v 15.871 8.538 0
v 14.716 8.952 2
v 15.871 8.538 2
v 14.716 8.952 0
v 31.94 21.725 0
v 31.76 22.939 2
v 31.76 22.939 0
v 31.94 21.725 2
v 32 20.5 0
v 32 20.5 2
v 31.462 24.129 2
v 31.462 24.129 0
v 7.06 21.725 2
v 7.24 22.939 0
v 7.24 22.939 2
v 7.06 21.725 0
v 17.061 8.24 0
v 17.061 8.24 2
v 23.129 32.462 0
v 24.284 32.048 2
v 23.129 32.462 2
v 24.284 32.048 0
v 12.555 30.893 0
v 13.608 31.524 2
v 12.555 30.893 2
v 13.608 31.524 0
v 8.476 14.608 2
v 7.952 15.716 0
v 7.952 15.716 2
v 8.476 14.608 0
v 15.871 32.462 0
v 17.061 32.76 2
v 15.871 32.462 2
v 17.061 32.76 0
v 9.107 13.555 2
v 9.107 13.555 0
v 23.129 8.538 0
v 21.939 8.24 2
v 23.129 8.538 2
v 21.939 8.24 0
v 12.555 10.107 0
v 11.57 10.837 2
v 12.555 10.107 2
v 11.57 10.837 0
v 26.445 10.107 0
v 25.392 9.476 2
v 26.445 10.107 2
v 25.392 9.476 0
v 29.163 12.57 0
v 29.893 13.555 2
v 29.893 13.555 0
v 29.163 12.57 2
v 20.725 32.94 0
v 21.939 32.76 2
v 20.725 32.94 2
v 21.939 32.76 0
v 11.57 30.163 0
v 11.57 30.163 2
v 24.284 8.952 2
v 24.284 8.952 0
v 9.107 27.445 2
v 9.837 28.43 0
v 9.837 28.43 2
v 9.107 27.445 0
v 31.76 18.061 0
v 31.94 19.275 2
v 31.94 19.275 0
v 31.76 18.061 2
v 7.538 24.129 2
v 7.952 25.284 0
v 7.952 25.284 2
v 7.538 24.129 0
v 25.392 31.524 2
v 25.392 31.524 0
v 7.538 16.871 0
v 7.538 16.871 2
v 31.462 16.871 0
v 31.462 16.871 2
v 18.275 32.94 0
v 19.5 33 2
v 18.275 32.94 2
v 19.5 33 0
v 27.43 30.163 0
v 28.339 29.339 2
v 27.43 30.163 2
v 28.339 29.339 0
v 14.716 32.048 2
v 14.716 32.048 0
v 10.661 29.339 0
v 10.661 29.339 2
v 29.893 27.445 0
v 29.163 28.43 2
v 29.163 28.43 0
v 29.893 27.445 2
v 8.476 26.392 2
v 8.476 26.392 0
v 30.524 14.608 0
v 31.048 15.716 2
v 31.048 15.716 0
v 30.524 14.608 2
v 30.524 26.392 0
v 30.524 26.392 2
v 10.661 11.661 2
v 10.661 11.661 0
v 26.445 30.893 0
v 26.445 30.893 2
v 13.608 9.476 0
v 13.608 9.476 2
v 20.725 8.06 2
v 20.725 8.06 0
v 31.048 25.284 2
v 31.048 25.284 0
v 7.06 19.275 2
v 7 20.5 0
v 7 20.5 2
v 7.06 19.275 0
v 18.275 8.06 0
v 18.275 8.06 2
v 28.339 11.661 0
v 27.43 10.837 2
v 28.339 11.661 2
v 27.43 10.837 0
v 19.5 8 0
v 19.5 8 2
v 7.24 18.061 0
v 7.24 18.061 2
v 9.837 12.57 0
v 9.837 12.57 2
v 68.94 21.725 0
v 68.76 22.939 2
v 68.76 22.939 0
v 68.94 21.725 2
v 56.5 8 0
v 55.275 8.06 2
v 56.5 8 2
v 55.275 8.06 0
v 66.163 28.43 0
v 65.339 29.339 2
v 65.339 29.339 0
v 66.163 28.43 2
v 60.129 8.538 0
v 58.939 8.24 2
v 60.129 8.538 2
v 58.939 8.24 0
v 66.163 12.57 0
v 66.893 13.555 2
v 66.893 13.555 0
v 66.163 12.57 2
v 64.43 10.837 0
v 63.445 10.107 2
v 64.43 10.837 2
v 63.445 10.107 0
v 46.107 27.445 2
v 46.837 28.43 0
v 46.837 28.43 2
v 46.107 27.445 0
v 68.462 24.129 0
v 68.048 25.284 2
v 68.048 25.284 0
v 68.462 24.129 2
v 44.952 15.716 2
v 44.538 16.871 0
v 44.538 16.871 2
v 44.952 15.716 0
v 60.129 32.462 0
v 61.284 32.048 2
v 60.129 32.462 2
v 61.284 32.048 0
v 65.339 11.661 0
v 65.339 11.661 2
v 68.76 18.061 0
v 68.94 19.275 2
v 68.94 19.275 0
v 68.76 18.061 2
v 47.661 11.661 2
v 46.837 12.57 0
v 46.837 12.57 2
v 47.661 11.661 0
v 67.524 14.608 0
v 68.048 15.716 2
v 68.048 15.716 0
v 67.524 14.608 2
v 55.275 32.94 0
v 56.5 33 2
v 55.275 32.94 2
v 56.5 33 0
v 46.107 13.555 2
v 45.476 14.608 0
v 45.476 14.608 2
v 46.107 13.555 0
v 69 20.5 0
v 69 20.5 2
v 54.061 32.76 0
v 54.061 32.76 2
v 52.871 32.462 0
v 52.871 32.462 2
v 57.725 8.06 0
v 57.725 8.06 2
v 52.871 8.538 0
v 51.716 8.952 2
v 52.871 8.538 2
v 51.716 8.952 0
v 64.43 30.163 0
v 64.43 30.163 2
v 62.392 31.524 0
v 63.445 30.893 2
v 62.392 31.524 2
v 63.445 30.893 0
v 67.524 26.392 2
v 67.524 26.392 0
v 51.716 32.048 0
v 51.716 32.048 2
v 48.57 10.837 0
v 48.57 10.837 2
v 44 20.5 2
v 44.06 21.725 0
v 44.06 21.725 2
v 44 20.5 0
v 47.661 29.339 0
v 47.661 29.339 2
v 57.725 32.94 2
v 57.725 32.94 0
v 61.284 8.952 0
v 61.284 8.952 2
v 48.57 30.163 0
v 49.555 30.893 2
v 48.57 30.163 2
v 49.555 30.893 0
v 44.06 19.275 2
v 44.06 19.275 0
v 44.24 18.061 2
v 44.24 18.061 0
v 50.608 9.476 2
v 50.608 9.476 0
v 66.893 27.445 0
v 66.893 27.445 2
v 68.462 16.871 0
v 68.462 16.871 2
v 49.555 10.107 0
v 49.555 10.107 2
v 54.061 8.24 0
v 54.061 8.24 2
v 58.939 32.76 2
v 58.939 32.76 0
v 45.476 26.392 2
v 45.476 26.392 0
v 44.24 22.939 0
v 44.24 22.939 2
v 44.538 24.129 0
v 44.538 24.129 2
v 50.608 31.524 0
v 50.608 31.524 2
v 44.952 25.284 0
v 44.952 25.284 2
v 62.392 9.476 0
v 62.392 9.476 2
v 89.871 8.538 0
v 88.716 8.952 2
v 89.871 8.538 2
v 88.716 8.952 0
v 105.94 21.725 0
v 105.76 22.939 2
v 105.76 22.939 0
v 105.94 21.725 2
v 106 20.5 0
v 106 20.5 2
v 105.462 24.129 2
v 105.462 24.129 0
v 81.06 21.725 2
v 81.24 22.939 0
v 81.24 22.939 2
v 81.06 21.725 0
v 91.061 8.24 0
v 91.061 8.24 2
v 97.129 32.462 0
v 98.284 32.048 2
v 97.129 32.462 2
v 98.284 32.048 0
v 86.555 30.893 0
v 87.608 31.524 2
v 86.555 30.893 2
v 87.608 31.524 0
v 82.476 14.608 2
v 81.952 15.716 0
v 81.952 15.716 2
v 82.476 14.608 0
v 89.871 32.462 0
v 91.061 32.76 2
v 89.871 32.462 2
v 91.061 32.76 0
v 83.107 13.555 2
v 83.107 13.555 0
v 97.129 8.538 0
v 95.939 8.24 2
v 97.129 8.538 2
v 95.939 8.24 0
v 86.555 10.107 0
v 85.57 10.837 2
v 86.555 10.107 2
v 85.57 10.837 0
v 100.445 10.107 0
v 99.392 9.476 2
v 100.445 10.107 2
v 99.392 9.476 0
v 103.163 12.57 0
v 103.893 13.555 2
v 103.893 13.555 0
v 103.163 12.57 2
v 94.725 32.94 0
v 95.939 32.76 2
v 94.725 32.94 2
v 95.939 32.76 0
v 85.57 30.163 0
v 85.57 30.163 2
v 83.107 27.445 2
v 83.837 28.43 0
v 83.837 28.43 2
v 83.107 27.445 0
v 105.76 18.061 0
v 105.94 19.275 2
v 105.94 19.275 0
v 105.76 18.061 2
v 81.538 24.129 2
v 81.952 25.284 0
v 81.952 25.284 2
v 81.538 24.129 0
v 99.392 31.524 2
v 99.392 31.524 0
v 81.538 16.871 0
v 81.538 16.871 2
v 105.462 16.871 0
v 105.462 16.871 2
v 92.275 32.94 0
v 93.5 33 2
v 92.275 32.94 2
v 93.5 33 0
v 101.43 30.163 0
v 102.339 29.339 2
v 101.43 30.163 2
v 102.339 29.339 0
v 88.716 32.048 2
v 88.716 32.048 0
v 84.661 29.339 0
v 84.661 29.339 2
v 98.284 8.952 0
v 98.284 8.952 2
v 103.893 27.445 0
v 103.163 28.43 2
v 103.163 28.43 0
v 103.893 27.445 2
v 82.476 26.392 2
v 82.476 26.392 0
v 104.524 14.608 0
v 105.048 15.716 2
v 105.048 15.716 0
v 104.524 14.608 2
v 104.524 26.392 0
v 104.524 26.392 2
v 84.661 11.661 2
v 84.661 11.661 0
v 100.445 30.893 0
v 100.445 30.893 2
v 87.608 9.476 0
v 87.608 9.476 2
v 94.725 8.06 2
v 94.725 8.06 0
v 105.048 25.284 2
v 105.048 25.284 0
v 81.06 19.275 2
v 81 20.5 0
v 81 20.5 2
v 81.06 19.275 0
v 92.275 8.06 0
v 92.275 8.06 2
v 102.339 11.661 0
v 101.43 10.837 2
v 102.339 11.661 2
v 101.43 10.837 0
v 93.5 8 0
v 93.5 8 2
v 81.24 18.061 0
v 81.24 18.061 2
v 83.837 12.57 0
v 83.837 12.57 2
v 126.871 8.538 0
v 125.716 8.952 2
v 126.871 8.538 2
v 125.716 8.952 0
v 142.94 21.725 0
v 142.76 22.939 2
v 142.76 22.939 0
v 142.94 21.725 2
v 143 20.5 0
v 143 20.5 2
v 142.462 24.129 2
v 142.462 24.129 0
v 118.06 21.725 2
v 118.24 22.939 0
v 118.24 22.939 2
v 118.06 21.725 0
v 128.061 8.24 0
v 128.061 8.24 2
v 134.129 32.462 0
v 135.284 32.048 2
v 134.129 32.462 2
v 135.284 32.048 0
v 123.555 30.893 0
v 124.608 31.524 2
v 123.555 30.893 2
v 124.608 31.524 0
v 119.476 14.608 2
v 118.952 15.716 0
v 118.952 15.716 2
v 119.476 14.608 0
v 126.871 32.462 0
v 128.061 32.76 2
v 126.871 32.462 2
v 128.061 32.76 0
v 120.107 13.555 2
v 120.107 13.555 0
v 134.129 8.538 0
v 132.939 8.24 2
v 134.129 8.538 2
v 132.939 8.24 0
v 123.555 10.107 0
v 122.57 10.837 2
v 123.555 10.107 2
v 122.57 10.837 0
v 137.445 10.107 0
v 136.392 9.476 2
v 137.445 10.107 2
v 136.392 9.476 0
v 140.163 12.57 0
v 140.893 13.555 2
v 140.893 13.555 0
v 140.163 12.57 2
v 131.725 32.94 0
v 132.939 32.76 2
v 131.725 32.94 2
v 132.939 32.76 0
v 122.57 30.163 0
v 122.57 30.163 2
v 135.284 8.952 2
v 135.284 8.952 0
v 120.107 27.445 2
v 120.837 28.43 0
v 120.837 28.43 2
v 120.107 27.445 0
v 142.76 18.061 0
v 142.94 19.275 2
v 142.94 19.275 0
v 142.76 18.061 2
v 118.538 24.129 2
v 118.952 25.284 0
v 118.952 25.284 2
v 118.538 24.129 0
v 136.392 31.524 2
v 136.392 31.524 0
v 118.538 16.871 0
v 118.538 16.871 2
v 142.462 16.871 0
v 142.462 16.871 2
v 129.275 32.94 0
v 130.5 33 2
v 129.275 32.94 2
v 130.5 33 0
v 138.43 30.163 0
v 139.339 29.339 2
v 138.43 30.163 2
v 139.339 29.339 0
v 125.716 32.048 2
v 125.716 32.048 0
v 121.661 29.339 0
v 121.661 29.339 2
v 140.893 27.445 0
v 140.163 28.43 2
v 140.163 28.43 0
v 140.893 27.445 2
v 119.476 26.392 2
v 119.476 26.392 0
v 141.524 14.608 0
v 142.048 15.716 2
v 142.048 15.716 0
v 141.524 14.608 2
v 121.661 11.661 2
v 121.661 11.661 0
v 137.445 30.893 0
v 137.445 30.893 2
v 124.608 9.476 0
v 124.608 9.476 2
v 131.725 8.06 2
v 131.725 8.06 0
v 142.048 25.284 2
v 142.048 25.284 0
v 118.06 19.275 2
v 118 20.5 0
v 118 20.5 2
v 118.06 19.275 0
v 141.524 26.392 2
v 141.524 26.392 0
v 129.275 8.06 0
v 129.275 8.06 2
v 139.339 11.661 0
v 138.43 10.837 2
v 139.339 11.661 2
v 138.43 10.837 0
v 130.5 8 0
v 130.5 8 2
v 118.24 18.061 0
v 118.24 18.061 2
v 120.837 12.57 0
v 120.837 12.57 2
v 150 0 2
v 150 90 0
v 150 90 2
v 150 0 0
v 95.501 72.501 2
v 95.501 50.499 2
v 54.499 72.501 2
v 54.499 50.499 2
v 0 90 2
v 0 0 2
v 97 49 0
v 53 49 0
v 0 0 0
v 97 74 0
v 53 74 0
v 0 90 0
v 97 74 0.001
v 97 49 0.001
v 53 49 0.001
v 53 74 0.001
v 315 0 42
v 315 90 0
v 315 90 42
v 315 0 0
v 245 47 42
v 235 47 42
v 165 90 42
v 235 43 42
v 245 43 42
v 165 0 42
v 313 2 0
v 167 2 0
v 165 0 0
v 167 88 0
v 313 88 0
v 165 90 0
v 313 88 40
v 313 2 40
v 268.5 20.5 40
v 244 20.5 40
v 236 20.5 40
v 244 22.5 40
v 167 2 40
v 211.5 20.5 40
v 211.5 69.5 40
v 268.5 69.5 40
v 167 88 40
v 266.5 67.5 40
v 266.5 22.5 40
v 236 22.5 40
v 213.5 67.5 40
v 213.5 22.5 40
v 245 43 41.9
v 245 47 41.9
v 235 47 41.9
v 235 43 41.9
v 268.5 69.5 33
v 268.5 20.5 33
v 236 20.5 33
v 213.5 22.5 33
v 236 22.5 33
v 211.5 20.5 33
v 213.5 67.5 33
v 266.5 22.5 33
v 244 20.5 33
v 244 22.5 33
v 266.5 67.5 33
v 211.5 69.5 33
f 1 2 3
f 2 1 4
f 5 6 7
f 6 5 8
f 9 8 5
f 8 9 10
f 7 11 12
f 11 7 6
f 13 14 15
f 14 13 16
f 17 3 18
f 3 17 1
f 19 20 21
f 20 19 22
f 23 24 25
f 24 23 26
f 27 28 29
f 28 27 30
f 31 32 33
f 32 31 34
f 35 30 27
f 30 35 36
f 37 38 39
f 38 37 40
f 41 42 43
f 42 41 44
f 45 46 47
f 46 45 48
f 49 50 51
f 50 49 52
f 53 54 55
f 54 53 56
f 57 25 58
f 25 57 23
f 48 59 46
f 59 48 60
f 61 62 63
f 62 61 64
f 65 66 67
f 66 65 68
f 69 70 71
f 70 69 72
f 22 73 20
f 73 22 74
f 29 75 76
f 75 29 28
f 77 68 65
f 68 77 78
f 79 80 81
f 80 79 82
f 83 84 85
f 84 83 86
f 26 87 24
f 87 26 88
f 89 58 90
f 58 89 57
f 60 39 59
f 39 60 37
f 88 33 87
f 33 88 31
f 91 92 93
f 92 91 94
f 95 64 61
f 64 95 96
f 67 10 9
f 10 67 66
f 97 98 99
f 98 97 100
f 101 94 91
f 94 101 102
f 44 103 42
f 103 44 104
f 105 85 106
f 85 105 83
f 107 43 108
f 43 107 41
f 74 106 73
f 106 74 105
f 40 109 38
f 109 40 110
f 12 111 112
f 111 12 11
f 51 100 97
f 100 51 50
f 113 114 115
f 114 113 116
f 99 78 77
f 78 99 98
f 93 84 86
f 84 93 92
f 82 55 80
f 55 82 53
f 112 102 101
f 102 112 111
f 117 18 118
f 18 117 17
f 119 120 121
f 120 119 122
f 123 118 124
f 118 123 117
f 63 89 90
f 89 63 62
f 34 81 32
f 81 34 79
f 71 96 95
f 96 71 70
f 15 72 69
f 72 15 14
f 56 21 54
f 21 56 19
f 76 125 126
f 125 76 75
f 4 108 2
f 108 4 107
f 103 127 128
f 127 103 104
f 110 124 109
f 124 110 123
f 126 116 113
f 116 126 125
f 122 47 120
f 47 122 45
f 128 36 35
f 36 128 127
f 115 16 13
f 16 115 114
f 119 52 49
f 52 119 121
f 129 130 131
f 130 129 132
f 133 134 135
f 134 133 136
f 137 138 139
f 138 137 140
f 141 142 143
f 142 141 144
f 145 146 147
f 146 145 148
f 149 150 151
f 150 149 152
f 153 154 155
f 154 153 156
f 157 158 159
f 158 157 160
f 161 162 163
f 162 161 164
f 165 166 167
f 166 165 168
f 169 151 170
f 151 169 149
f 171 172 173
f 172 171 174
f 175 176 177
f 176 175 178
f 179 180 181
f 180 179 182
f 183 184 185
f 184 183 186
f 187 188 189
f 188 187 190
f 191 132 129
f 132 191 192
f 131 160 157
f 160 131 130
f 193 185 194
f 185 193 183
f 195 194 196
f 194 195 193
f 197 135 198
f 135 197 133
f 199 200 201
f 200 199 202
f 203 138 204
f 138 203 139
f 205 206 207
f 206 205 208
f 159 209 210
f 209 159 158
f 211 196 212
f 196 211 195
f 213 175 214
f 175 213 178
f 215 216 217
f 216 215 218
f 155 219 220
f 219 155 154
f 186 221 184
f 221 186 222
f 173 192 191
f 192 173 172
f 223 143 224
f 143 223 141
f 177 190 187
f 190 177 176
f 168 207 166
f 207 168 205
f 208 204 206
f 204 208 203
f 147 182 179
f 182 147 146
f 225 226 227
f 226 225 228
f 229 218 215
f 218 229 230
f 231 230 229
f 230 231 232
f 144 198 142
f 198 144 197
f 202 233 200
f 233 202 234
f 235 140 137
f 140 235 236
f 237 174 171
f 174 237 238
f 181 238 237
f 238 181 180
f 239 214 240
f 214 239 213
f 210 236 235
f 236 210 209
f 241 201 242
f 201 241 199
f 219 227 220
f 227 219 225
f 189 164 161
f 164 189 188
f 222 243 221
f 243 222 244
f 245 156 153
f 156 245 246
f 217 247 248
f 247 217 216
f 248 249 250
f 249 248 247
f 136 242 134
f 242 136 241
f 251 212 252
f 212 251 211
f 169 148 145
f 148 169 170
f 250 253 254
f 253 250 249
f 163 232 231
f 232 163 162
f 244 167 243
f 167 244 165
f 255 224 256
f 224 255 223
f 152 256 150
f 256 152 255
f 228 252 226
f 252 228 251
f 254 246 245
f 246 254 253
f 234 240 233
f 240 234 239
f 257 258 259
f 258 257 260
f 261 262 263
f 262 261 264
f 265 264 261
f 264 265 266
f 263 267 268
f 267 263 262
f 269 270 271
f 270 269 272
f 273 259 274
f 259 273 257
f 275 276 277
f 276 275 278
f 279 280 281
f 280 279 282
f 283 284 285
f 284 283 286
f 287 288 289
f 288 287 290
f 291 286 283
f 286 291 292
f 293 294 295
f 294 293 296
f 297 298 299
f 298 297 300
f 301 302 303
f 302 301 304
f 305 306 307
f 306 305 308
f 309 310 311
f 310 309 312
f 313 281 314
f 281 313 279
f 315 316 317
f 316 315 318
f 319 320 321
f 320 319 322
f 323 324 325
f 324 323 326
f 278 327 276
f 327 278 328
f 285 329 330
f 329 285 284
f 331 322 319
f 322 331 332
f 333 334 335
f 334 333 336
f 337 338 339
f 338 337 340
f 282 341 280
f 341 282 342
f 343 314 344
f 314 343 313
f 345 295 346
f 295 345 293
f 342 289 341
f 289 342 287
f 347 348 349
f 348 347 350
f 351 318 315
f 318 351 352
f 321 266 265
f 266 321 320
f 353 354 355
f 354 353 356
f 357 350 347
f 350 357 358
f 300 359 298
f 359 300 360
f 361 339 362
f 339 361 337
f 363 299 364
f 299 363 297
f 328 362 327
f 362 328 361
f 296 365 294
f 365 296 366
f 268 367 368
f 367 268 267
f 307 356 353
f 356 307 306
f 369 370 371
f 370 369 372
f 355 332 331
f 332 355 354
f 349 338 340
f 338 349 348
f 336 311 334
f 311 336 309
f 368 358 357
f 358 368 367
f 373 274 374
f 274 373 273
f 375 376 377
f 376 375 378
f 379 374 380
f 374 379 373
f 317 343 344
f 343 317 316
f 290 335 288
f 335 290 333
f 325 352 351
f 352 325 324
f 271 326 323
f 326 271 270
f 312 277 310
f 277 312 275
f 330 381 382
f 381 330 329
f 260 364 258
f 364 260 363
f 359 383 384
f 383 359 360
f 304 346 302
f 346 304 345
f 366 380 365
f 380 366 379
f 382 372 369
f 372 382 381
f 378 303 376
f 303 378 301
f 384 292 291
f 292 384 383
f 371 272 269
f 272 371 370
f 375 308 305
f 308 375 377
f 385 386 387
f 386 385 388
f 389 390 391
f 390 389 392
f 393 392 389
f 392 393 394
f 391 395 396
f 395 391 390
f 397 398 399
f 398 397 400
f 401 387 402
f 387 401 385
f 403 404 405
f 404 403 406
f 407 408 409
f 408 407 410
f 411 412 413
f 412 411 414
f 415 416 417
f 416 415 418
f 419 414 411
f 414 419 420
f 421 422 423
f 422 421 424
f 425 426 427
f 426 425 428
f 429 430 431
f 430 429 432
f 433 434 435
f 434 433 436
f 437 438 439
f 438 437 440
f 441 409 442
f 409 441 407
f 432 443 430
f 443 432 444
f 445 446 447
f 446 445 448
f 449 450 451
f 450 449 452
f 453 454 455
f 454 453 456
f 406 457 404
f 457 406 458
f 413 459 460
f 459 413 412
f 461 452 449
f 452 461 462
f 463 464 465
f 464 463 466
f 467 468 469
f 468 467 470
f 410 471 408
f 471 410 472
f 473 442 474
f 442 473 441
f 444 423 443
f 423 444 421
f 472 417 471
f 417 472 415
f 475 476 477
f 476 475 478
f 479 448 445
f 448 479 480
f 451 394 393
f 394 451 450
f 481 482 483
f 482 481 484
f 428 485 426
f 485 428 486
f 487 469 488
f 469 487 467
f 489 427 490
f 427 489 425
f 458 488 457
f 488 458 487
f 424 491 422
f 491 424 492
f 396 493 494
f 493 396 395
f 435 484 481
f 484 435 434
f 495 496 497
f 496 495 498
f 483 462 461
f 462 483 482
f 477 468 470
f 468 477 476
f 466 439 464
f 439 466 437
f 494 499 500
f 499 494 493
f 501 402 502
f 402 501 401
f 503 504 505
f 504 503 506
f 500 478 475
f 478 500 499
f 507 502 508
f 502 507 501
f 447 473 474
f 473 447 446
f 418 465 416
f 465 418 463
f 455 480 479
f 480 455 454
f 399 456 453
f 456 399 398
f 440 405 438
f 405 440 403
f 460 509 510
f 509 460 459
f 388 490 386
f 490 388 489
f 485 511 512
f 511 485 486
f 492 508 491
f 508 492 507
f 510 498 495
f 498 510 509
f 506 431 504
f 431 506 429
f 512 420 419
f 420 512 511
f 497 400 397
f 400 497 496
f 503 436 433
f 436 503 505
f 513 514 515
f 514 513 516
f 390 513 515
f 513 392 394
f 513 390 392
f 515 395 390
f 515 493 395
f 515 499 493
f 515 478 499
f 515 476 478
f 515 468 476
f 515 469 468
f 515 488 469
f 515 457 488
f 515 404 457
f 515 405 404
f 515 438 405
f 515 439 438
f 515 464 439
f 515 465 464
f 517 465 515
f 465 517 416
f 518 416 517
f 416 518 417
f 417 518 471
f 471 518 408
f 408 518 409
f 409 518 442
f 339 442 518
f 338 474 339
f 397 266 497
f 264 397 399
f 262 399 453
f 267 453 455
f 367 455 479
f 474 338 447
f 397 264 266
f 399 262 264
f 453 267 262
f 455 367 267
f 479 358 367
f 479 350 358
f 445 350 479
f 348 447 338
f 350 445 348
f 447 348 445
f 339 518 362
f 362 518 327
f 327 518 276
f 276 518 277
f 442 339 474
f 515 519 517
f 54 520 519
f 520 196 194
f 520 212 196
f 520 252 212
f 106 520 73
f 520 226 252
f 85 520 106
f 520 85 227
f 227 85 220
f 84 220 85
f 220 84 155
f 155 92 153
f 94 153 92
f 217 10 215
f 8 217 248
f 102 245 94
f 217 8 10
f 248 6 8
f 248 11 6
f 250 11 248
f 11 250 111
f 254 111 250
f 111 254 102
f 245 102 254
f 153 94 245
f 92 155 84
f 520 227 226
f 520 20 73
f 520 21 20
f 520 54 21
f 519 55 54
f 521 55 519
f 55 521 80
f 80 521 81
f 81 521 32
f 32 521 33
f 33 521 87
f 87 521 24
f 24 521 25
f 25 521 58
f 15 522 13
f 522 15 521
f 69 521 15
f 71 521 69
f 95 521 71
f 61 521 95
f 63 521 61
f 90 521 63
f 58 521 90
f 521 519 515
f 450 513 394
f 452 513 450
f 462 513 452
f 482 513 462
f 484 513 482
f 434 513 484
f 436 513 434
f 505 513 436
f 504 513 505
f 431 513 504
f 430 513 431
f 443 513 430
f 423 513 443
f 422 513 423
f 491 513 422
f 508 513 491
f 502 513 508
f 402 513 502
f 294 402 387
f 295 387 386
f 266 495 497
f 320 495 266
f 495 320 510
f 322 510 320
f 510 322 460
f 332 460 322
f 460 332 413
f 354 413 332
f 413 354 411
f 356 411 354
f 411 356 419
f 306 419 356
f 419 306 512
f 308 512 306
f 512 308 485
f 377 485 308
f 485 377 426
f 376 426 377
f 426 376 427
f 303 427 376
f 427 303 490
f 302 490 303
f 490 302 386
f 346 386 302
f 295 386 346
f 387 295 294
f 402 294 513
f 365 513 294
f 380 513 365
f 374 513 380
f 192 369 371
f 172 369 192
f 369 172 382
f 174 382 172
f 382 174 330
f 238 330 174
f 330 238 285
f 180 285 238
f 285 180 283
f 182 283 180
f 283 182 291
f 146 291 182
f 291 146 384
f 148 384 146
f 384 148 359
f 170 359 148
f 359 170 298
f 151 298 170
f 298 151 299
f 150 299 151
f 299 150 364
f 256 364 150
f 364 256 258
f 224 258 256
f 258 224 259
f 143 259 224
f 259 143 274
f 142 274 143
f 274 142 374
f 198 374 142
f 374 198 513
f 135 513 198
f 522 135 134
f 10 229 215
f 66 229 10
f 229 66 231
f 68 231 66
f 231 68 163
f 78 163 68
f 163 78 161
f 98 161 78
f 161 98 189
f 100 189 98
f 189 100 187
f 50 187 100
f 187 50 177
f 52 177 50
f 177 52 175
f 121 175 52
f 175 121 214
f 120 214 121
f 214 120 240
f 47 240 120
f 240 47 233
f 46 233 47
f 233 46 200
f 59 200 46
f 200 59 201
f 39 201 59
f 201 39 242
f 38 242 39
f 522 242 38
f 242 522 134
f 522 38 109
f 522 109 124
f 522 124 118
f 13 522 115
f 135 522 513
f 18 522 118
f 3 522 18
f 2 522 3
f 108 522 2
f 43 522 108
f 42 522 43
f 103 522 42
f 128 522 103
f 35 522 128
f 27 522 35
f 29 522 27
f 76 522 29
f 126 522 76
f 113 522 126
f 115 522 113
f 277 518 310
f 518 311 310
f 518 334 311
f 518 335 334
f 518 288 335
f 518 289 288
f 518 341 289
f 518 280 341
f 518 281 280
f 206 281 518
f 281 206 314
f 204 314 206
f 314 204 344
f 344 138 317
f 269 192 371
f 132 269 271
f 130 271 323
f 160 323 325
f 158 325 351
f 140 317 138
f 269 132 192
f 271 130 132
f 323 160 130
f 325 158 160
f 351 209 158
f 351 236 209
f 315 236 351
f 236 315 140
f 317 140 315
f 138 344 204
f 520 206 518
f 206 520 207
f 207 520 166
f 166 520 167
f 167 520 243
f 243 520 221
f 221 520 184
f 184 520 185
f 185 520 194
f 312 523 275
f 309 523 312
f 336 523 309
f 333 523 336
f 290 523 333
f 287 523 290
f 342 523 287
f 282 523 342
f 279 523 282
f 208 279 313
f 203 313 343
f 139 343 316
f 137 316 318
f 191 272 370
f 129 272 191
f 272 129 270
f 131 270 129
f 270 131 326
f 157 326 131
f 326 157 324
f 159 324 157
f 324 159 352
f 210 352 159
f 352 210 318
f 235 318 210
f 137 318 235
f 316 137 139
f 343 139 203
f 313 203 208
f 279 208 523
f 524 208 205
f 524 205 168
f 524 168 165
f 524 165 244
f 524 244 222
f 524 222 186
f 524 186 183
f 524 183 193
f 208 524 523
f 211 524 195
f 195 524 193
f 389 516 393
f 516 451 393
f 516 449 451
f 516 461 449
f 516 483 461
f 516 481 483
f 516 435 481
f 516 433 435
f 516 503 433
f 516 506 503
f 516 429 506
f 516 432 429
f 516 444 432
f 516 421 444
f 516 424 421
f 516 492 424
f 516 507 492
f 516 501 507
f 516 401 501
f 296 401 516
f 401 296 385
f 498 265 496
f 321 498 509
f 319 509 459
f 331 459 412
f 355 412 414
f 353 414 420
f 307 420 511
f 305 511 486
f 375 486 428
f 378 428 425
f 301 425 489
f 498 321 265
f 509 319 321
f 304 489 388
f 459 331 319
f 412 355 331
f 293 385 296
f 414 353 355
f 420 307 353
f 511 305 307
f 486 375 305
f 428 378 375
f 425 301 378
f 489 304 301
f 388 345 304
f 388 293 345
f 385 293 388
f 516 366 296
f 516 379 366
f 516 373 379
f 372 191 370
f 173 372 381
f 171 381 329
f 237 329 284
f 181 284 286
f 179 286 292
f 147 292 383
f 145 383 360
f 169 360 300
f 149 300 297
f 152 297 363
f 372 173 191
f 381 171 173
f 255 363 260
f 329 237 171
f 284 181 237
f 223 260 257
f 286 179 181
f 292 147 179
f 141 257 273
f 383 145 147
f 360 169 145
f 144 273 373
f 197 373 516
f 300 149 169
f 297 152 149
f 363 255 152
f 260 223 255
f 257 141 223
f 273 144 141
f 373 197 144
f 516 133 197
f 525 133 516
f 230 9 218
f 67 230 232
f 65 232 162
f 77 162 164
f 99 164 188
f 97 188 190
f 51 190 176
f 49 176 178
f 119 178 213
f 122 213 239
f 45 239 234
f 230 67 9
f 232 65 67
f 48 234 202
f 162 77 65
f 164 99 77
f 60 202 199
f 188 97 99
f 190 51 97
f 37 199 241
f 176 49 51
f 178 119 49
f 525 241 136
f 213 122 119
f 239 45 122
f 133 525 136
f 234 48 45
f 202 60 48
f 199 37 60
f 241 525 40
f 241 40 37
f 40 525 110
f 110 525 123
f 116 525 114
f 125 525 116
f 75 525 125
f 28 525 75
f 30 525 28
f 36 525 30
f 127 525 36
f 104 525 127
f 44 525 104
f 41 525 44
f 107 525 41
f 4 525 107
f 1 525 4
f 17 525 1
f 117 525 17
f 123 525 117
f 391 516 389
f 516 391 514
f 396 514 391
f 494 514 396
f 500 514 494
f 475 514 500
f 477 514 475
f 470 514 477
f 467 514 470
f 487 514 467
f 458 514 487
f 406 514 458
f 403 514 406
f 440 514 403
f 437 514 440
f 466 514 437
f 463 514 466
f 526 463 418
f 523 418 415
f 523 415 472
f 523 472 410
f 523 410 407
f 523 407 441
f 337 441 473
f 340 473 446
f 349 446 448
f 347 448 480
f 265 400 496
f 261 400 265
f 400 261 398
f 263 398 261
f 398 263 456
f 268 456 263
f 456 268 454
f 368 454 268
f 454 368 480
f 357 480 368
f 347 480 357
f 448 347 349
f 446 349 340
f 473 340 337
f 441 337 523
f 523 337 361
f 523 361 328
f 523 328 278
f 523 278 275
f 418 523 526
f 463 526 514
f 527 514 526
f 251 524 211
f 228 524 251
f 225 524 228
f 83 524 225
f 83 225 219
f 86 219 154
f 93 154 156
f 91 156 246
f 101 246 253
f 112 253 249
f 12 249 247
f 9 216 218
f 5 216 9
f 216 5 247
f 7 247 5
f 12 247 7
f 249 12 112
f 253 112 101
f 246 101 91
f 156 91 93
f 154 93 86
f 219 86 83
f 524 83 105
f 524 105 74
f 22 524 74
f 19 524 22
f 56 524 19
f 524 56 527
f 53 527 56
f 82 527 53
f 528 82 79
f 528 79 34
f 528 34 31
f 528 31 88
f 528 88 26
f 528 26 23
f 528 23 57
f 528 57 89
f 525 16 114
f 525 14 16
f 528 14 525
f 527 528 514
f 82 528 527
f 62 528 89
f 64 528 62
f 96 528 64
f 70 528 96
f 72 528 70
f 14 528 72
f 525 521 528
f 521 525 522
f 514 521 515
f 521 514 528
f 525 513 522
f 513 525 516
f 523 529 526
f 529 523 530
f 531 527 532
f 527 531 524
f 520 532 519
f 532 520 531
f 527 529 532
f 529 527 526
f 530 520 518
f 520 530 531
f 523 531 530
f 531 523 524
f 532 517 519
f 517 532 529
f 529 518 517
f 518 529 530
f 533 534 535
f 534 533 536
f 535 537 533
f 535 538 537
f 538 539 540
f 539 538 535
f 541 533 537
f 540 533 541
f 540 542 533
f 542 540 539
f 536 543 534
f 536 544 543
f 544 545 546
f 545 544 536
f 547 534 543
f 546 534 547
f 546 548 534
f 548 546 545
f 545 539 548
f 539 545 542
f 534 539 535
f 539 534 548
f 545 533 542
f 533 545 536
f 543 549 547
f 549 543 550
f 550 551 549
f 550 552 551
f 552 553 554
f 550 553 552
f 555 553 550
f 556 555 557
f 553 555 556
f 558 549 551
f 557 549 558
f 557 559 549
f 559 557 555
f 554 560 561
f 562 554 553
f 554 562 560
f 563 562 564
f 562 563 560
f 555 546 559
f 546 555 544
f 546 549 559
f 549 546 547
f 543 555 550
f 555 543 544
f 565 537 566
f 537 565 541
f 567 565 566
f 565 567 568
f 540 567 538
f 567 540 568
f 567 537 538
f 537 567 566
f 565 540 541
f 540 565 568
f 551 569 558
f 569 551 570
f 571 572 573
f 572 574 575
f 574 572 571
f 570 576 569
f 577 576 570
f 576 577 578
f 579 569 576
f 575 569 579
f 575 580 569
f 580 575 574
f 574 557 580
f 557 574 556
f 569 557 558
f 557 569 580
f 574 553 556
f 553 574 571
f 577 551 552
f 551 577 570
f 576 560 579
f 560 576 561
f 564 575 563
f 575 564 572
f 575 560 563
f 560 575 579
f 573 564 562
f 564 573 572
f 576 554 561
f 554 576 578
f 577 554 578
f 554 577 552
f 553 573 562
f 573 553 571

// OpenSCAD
// ============================================================
// Mitat
// ============================================================
plate_w = 150;
plate_h = 90;
plate_t = 2;

box_d  = 40;   // sisätilan syvyys
wall_t =  2;   // seinämien paksuus

// ============================================================
// Napit
// ============================================================
button_d     = 25;
button_r     = button_d / 2;
button_gap   = 12;
button_count =  4;
button_y     = 8 + button_r;

buttons_total_w = button_count * button_d + (button_count - 1) * button_gap;
button_margin   = (plate_w - buttons_total_w) / 2;
button_start_x  = button_margin + button_r;

// ============================================================
// Näyttöaukko
// ============================================================
disp_w  = 44;
disp_h  = 25;
disp_x  = (plate_w - disp_w) / 2;
button_top = button_y + button_r;
disp_y  = button_top + (plate_h - button_top) / 2 - disp_h / 2;
chamfer = 1.5;

// ============================================================
// USB-C takalevyssä
// ============================================================
usb_w = 10;
usb_h =  4;
usb_x = (plate_w - usb_w) / 2;
usb_y = (plate_h - usb_h) / 2;

// ============================================================
// Akkukehys  LP704452  52 × 44 × 7 mm
// Akku tipahtaa alas avoimen etuaukon (z=0) kautta.
// Etuseinä pitää akun Z-suunnassa paikallaan.
// ============================================================
bat_l   = 52;
bat_w   = 44;
bat_h   =  7;
bat_tol =  0.5;   // ilmarako per sivu
clip_t  =  2;     // kehyksen seinämäpaksuus

// Johtojen ulosvientiaukko yhdessä sivussa
wire_slot_w =  8;  // johtoaukon leveys

// Akun sijainti kotelo-koordinaateissa (keskitetty sisätilaan)
bat_x = wall_t + ((plate_w - 2*wall_t) - bat_l) / 2;
bat_y = wall_t + ((plate_h - 2*wall_t) - bat_w) / 2;

// Suorakaiteinen kehys ilman huulia.
// Ulkomitat: (bat_l + 2*bat_tol + 2*clip_t) × (bat_w + 2*bat_tol + 2*clip_t)
// Sisämitat: (bat_l + 2*bat_tol) × (bat_w + 2*bat_tol)   → 0.5 mm ilmarako per sivu
// Korkeus = bat_h  (seinä tasainen akun etupinnan kanssa, etuseinä sulkee)
module battery_tray() {
    h  = bat_h;
    tl = bat_tol;
    z0 = box_d - h;

    translate([bat_x - tl - clip_t, bat_y - tl - clip_t, z0])
    difference() {
        cube([bat_l + 2*(tl + clip_t), bat_w + 2*(tl + clip_t), h]);
        // Akun tasku
        translate([clip_t, clip_t, -0.1])
            cube([bat_l + 2*tl, bat_w + 2*tl, h + 0.2]);
        // Johtoaukko yhdessä sivussa (bat_y-puoli, alareunan seinä)
        translate([(bat_l + 2*tl - wire_slot_w) / 2 + clip_t, -0.1, 0])
            cube([wire_slot_w, clip_t + 0.2, h]);
    }
}

// ============================================================
// Moduulit
// ============================================================

module chamfered_hole(w, h, t, c) {
    hull() {
        translate([0, 0, 0]) cube([w, h, 0.001]);
        translate([c, c, t]) cube([w - 2*c, h - 2*c, 0.001]);
    }
}

module front_panel() {
    difference() {
        cube([plate_w, plate_h, plate_t]);

        // Napit
        for (i = [0 : button_count - 1])
            translate([button_start_x + i * (button_d + button_gap), button_y, -1])
                cylinder(h = plate_t + 2, r = button_r, $fn = 64);

        // Näyttöaukko viisteineen
        translate([disp_x, disp_y, 0])
            chamfered_hole(disp_w, disp_h, plate_t, chamfer);
    }
}

module box_body() {
    union() {
        difference() {
            // Ulkokuori
            cube([plate_w, plate_h, box_d + wall_t]);
            // Sisäontelo – avoin edestä
            translate([wall_t, wall_t, 0])
                cube([plate_w - 2*wall_t, plate_h - 2*wall_t, box_d]);
            // USB-C aukko takaseinässä
            translate([usb_x, usb_y, box_d + wall_t - 0.1])
                cube([usb_w, usb_h, wall_t + 0.2]);
        }
        // Akkukehys sisäpuolella
        battery_tray();
    }
}

// ============================================================
// Renderöinti – kappaleet vierekkäin tulostusasentoa varten
// ============================================================
front_panel();

translate([plate_w + 15, 0, 0])
    box_body();
